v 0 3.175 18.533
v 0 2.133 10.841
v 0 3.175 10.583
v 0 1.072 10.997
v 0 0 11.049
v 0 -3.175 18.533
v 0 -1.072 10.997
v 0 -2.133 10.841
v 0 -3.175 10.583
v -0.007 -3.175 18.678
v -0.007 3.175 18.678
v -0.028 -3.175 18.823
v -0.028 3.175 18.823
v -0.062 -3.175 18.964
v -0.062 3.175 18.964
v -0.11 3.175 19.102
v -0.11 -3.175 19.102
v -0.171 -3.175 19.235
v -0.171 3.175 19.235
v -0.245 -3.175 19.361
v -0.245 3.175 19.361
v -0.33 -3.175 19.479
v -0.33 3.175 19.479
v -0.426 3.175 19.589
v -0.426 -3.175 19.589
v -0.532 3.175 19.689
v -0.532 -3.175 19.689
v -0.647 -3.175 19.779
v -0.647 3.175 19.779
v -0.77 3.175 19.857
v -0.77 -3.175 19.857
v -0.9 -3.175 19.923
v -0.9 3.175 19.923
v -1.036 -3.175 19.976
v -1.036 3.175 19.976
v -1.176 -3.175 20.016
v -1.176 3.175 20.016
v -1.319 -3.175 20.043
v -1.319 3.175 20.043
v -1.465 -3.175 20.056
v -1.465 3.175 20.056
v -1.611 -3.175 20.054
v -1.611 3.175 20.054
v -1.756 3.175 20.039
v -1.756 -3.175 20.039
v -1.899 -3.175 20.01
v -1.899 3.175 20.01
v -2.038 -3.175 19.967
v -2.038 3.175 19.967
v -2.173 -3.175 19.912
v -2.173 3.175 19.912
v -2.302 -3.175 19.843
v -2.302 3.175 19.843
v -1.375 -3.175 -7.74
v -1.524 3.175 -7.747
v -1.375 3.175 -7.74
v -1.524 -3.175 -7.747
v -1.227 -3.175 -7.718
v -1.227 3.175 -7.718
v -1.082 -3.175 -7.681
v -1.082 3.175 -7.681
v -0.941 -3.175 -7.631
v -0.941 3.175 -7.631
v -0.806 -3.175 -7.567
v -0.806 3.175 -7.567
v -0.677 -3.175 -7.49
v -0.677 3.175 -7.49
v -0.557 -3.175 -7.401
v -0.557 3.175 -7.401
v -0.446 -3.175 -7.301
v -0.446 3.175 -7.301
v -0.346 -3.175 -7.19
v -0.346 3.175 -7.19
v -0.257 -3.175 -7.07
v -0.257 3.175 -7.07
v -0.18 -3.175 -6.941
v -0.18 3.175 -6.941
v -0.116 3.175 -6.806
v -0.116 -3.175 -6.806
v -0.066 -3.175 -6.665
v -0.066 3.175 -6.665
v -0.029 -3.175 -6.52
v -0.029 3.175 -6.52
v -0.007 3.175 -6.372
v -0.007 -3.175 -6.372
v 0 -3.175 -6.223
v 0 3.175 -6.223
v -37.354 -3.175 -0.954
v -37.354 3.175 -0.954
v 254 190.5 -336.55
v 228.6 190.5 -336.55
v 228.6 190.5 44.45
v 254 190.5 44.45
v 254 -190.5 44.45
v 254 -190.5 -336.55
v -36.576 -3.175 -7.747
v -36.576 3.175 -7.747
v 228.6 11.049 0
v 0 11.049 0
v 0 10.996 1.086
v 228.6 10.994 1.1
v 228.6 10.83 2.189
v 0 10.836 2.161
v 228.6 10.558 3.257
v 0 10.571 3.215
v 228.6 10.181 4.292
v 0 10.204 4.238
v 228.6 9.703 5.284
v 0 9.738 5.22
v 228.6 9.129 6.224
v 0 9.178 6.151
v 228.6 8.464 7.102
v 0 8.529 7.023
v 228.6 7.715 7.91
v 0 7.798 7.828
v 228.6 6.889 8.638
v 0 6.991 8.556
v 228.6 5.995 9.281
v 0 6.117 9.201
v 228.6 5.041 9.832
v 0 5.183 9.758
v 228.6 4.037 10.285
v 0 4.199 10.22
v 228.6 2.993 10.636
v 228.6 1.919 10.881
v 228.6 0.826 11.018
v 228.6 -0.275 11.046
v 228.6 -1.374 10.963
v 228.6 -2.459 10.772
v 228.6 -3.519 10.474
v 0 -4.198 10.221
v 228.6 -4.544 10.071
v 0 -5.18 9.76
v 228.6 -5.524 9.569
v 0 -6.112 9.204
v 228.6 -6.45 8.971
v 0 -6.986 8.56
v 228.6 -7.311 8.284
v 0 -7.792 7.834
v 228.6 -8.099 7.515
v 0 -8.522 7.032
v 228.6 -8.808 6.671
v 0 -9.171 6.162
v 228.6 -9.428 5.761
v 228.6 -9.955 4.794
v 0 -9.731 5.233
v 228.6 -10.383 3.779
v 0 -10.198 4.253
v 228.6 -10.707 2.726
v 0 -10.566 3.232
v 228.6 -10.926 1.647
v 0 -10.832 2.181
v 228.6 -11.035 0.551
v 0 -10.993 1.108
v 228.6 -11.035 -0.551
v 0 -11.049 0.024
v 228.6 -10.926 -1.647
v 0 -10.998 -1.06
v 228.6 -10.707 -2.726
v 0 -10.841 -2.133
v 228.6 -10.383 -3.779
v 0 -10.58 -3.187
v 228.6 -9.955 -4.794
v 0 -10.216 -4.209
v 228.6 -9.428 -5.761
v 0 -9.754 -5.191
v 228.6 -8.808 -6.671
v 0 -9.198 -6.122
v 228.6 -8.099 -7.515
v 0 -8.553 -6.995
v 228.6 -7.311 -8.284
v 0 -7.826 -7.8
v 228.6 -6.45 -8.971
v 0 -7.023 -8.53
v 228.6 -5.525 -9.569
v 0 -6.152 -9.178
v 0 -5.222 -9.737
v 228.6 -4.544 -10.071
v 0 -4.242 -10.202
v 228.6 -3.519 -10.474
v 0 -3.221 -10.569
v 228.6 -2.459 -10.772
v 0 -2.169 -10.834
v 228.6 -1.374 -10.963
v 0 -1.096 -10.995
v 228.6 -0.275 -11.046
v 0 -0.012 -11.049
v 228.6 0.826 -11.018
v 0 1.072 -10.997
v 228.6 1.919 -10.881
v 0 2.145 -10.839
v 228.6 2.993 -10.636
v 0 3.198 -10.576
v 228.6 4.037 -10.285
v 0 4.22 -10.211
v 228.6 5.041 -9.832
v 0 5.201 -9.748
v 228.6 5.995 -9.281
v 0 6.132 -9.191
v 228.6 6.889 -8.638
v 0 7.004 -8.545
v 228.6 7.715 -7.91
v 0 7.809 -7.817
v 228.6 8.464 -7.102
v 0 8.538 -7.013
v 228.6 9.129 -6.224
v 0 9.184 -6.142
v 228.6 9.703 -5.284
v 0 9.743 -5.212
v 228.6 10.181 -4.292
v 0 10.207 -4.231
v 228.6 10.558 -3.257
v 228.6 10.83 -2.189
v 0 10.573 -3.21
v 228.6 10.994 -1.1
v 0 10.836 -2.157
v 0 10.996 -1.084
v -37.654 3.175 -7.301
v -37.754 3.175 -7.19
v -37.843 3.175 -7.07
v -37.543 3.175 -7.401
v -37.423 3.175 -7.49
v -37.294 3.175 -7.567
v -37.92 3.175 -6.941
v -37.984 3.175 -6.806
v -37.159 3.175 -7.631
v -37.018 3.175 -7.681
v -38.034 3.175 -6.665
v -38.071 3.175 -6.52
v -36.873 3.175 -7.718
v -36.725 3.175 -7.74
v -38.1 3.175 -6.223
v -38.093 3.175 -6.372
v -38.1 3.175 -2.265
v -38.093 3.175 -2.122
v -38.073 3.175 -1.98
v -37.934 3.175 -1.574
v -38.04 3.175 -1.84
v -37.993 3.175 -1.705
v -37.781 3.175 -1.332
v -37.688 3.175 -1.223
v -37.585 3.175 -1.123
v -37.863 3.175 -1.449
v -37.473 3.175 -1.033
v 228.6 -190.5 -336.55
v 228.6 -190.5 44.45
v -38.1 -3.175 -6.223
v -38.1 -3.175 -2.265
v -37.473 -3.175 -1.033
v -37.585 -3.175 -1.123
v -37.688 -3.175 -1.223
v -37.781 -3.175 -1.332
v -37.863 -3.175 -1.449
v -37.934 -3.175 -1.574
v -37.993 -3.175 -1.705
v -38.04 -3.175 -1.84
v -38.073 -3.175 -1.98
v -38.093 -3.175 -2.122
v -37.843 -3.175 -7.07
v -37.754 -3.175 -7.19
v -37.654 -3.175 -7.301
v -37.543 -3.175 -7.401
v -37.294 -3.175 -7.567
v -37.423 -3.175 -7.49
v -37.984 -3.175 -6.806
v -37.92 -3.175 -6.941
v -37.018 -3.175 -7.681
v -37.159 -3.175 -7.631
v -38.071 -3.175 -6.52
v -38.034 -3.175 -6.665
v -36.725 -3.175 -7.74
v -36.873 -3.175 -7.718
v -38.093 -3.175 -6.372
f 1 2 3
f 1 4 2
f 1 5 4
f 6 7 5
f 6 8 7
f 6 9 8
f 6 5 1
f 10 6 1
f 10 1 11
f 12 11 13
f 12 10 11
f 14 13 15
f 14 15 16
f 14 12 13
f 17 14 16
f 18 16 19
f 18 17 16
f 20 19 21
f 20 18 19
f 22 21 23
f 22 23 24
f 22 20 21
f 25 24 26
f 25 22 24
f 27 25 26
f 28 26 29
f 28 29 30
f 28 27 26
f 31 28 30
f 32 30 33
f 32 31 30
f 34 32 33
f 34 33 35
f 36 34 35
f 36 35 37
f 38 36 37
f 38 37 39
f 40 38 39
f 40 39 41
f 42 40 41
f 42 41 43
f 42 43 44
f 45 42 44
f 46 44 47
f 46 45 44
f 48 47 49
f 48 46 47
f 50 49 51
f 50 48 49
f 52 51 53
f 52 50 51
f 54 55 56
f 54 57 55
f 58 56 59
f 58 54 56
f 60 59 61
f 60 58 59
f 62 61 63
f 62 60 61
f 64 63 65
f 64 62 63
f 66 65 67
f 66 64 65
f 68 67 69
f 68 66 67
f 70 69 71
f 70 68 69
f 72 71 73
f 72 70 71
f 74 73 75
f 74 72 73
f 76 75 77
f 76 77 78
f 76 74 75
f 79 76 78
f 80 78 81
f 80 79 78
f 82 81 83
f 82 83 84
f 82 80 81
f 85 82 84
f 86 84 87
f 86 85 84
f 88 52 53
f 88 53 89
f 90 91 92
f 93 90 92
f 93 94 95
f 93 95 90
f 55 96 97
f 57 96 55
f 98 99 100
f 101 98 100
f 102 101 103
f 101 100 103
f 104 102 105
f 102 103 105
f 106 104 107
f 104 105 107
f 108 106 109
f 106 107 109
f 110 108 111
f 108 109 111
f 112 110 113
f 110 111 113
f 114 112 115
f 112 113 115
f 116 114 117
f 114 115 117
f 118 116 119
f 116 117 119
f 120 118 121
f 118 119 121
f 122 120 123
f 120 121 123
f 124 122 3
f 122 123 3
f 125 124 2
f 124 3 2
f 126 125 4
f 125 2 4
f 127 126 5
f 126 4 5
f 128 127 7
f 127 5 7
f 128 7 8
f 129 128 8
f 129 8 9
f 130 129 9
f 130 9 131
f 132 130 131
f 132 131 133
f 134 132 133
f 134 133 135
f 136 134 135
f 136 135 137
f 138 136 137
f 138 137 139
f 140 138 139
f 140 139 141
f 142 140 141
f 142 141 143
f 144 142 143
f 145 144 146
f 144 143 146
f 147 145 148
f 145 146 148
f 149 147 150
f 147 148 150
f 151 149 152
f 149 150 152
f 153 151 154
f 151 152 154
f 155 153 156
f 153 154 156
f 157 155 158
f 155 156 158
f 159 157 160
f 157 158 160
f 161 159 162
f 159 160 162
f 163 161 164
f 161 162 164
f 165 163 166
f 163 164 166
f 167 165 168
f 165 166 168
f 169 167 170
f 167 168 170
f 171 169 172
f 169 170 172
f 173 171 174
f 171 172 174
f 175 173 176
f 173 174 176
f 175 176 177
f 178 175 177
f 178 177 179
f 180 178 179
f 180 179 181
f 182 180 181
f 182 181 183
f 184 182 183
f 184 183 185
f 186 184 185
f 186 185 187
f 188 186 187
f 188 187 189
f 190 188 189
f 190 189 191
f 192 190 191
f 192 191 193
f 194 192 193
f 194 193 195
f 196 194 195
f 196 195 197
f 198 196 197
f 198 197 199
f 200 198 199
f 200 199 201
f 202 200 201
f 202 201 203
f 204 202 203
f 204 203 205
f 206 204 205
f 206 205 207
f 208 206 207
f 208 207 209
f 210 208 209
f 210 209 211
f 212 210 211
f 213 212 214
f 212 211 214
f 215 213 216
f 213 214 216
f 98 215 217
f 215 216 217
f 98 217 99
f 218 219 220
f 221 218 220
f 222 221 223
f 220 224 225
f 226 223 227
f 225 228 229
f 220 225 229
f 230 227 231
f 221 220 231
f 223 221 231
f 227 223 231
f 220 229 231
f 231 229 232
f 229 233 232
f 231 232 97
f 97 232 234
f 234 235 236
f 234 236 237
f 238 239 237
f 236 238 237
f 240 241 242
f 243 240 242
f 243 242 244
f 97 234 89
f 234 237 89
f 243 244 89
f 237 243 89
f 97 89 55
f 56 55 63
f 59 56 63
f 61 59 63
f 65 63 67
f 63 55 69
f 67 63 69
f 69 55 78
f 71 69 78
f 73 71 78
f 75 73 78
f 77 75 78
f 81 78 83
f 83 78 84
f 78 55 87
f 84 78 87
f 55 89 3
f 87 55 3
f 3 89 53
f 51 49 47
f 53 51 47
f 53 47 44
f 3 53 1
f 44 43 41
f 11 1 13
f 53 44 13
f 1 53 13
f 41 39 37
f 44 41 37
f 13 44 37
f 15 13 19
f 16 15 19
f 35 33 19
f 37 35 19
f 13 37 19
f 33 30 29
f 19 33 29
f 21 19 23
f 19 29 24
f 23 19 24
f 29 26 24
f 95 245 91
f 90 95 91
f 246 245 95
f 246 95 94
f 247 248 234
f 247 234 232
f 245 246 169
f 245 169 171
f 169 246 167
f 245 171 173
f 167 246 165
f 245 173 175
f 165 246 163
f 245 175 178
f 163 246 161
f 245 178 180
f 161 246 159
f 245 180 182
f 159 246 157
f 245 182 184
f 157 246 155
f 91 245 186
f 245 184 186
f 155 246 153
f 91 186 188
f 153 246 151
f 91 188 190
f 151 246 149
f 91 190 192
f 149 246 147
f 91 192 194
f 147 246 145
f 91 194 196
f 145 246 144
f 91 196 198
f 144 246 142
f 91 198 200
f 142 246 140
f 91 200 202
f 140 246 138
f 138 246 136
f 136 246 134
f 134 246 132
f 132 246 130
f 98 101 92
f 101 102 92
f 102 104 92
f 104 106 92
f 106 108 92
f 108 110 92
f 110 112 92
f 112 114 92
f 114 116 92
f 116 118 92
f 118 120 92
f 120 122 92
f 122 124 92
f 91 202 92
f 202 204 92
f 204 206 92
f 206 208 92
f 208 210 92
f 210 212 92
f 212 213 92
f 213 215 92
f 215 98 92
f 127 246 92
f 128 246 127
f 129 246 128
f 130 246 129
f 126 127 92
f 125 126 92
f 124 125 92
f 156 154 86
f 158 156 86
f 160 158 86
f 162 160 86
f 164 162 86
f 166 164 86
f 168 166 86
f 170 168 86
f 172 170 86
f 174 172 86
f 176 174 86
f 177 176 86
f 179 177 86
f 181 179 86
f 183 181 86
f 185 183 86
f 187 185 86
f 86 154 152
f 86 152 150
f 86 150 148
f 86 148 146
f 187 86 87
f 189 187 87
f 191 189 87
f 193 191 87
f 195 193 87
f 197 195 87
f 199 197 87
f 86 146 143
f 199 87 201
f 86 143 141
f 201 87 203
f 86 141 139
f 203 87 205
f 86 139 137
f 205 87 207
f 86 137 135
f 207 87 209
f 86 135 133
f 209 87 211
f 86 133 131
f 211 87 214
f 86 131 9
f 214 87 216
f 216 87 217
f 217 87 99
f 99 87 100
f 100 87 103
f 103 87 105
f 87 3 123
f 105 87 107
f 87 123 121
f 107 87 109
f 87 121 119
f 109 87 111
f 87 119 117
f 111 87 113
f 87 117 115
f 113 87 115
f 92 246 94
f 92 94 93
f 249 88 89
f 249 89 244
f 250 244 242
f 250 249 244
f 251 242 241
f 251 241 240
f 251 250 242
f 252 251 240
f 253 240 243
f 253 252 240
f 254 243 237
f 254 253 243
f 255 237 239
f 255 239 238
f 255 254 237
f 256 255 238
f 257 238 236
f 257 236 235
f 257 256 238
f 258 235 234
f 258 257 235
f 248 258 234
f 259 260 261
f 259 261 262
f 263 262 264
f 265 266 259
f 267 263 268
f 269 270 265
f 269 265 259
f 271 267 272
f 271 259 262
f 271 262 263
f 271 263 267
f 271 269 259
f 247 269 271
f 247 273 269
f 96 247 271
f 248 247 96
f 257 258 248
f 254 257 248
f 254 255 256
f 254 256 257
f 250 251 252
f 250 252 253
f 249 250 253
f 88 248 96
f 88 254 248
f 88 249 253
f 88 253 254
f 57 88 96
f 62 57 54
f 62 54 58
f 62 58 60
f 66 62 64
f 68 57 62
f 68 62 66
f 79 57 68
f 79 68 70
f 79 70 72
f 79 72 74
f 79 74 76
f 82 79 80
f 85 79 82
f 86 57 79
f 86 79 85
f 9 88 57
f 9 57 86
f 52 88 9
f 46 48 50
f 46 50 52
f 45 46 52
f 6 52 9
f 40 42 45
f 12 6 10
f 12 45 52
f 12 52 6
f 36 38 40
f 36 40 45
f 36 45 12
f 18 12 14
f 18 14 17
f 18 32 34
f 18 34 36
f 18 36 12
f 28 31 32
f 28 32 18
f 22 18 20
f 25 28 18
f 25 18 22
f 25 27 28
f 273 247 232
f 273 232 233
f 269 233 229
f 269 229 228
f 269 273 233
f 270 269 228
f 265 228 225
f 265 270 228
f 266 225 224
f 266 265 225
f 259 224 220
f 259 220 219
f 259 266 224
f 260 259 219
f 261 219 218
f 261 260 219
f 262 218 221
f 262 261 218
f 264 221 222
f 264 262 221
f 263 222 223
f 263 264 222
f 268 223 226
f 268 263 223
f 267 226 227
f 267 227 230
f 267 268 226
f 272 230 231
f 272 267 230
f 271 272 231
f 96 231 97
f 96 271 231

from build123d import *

# Parameters (mm, degrees)
F1_DEPTH = 3.175
F2_R     = 11.049
F3_DEPTH = 228.6
F4_W     = 381
F4_H     = 381
F5_DEPTH = 25.4


with BuildPart() as f1:
    # F0 (on Front) → F1 (new body, symmetric)
    with BuildSketch(Plane.XZ):
        with BuildLine():
            Line((0, -6.223), (0, 18.5326917232))
            ThreePointArc((0, 18.5326917232), (-0.7698692632, 19.8570265871), (-2.3016572596, 19.843350026))
            Line((-2.3016572596, 19.843350026), (-37.3536572596, -0.954169974))
            ThreePointArc((-37.3536572596, -0.954169974), (-37.9003348639, -1.51069754), (-38.1, -2.2648282768))
            Line((-38.1, -2.2648282768), (-38.1, -6.223))
            ThreePointArc((-38.1, -6.223), (-37.6536307345, -7.3006307345), (-36.576, -7.747))
            Line((-36.576, -7.747), (-1.524, -7.747))
            ThreePointArc((-1.524, -7.747), (-0.4463692655, -7.3006307345), (0, -6.223))
        make_face()
    extrude(amount=F1_DEPTH, both=True)

    # F2 (on Right) → F3 (join)
    with BuildSketch(Plane.YZ):
        Circle(F2_R)
    extrude(amount=F3_DEPTH)

    # F4 (on face) → F5 (join)
    with BuildSketch(Plane.YZ.offset(228.6)):
        with Locations((0, -146.05)):
            Rectangle(F4_W, F4_H)
    extrude(amount=F5_DEPTH)


solid = f1.part
